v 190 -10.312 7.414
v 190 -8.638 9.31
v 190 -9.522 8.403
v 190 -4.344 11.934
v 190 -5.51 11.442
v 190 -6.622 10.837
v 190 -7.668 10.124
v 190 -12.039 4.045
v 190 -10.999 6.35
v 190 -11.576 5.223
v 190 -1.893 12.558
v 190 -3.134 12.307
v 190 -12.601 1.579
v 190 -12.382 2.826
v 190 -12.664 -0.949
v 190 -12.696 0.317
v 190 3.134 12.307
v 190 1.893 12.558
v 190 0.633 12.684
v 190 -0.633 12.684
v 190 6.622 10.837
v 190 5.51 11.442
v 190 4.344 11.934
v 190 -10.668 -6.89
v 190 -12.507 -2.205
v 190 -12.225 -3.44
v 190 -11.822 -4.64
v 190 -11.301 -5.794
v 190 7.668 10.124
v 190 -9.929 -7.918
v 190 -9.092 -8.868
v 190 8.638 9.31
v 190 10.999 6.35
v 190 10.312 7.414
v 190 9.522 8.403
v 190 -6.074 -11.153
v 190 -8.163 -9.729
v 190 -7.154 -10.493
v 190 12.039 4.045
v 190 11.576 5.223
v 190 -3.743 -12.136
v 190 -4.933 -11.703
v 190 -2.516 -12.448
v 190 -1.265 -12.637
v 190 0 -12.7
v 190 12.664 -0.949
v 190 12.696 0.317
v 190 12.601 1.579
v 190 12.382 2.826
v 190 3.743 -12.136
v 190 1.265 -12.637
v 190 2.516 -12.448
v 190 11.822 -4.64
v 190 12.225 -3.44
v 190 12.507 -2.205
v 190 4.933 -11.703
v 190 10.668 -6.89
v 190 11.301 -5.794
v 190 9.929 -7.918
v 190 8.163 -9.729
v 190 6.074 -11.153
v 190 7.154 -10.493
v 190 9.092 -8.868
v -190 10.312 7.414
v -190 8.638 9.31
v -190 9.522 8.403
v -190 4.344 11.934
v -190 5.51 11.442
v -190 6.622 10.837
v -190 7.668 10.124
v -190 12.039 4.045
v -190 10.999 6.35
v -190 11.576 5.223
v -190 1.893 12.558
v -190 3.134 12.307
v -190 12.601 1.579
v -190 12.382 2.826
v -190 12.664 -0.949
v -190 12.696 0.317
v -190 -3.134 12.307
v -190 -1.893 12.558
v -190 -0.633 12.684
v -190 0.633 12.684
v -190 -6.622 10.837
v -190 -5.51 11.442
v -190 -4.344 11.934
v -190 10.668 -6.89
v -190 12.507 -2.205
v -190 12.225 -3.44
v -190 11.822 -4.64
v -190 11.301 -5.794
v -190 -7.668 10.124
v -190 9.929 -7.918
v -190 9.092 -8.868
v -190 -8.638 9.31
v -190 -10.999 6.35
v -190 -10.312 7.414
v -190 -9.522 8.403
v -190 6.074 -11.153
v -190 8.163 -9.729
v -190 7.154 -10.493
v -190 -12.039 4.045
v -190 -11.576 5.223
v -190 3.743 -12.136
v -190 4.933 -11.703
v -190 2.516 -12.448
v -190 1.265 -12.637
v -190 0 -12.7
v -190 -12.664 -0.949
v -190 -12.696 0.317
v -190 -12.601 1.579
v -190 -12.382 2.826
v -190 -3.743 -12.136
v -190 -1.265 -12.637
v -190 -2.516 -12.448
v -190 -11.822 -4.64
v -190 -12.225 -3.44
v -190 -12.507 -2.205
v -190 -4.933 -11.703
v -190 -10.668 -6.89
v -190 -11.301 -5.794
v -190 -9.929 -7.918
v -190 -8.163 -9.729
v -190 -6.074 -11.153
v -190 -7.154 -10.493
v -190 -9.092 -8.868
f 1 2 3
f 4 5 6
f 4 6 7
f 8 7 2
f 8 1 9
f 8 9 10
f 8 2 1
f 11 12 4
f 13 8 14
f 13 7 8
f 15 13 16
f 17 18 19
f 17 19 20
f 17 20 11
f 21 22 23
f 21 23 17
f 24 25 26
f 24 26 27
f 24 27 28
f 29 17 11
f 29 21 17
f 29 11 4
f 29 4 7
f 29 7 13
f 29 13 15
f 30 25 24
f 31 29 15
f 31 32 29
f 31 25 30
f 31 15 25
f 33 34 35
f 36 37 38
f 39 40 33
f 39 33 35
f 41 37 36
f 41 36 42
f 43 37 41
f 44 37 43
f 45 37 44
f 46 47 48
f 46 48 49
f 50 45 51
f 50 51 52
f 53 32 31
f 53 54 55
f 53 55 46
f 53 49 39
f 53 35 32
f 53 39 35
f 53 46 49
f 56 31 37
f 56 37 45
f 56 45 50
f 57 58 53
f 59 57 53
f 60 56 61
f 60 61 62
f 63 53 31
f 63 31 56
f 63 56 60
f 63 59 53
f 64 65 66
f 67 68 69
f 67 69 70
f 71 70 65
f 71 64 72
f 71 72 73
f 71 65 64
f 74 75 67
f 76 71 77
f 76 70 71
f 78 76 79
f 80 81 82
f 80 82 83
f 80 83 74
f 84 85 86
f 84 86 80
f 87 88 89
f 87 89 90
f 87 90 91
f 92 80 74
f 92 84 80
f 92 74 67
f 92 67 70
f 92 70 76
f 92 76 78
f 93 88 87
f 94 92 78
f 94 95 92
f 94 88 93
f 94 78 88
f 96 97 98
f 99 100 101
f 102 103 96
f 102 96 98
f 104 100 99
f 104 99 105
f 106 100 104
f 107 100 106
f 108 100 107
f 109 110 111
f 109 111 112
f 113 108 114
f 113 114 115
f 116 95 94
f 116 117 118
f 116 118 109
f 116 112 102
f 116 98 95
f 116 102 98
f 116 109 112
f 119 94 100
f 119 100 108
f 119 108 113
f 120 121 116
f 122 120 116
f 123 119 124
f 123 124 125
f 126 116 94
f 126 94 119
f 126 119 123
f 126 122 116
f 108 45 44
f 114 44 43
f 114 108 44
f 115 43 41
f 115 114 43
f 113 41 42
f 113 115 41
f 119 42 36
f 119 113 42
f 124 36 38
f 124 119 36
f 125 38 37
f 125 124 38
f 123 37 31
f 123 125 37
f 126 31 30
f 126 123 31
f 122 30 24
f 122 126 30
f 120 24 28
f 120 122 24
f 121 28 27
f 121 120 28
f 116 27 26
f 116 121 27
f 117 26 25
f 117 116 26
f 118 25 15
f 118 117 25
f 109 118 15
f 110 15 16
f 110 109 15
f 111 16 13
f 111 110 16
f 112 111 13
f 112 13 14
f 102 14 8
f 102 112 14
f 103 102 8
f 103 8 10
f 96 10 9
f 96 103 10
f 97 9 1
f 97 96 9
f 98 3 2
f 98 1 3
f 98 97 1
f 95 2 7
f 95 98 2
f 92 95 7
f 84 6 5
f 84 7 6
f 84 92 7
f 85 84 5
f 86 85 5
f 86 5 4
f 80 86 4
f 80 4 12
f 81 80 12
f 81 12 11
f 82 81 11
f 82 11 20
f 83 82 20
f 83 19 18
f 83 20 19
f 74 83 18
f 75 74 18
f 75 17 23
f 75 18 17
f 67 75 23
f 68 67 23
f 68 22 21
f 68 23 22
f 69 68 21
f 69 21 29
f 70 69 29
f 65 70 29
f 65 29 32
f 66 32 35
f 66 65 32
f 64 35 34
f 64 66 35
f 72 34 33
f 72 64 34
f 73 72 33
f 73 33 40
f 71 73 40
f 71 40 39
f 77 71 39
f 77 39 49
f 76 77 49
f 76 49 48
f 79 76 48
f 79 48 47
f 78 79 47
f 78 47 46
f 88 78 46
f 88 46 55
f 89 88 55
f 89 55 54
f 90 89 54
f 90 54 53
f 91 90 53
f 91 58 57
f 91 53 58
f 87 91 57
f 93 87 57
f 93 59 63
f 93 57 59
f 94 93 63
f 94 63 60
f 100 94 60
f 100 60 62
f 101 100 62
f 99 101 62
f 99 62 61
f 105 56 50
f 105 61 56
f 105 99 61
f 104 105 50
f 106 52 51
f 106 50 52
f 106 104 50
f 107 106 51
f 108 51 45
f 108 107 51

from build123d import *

# Parameters (mm, degrees)
BOSS_EXTRUDE1_DEPTH      = 175
BOSS_EXTRUDE1_DEPTH_BACK = 175
SKETCH1_R                = 12.7
SKETCH2_R                = 12.7
BOSS_EXTRUDE2_DEPTH      = 15
BOSS_EXTRUDE3_START      = 15
SKETCH3_R                = 12.7
BOSS_EXTRUDE3_DEPTH      = 15


with BuildPart() as part:
    # Sketch1 → Boss-Extrude1 (new, two sides: drawn at the far end of the back side and taken through both)
    with BuildSketch(Plane(origin=(0, 0, 0), x_dir=(0, 0, -1), z_dir=(1, 0, 0)).offset(-BOSS_EXTRUDE1_DEPTH_BACK)):
        Circle(SKETCH1_R)
    extrude(amount=BOSS_EXTRUDE1_DEPTH + BOSS_EXTRUDE1_DEPTH_BACK)

    # Sketch2 → Boss-Extrude2 (add)
    with BuildSketch(Plane(origin=(175, 0, 0), x_dir=(0, 0, -1), z_dir=(1, 0, 0))):
        Circle(SKETCH2_R)
    extrude(amount=BOSS_EXTRUDE2_DEPTH)

    # Sketch3 → Boss-Extrude3 (add)
    with BuildSketch(Plane.ZY.offset(175).offset(BOSS_EXTRUDE3_START)):
        Circle(SKETCH3_R)
    extrude(amount=-BOSS_EXTRUDE3_DEPTH)


solid = part.part
